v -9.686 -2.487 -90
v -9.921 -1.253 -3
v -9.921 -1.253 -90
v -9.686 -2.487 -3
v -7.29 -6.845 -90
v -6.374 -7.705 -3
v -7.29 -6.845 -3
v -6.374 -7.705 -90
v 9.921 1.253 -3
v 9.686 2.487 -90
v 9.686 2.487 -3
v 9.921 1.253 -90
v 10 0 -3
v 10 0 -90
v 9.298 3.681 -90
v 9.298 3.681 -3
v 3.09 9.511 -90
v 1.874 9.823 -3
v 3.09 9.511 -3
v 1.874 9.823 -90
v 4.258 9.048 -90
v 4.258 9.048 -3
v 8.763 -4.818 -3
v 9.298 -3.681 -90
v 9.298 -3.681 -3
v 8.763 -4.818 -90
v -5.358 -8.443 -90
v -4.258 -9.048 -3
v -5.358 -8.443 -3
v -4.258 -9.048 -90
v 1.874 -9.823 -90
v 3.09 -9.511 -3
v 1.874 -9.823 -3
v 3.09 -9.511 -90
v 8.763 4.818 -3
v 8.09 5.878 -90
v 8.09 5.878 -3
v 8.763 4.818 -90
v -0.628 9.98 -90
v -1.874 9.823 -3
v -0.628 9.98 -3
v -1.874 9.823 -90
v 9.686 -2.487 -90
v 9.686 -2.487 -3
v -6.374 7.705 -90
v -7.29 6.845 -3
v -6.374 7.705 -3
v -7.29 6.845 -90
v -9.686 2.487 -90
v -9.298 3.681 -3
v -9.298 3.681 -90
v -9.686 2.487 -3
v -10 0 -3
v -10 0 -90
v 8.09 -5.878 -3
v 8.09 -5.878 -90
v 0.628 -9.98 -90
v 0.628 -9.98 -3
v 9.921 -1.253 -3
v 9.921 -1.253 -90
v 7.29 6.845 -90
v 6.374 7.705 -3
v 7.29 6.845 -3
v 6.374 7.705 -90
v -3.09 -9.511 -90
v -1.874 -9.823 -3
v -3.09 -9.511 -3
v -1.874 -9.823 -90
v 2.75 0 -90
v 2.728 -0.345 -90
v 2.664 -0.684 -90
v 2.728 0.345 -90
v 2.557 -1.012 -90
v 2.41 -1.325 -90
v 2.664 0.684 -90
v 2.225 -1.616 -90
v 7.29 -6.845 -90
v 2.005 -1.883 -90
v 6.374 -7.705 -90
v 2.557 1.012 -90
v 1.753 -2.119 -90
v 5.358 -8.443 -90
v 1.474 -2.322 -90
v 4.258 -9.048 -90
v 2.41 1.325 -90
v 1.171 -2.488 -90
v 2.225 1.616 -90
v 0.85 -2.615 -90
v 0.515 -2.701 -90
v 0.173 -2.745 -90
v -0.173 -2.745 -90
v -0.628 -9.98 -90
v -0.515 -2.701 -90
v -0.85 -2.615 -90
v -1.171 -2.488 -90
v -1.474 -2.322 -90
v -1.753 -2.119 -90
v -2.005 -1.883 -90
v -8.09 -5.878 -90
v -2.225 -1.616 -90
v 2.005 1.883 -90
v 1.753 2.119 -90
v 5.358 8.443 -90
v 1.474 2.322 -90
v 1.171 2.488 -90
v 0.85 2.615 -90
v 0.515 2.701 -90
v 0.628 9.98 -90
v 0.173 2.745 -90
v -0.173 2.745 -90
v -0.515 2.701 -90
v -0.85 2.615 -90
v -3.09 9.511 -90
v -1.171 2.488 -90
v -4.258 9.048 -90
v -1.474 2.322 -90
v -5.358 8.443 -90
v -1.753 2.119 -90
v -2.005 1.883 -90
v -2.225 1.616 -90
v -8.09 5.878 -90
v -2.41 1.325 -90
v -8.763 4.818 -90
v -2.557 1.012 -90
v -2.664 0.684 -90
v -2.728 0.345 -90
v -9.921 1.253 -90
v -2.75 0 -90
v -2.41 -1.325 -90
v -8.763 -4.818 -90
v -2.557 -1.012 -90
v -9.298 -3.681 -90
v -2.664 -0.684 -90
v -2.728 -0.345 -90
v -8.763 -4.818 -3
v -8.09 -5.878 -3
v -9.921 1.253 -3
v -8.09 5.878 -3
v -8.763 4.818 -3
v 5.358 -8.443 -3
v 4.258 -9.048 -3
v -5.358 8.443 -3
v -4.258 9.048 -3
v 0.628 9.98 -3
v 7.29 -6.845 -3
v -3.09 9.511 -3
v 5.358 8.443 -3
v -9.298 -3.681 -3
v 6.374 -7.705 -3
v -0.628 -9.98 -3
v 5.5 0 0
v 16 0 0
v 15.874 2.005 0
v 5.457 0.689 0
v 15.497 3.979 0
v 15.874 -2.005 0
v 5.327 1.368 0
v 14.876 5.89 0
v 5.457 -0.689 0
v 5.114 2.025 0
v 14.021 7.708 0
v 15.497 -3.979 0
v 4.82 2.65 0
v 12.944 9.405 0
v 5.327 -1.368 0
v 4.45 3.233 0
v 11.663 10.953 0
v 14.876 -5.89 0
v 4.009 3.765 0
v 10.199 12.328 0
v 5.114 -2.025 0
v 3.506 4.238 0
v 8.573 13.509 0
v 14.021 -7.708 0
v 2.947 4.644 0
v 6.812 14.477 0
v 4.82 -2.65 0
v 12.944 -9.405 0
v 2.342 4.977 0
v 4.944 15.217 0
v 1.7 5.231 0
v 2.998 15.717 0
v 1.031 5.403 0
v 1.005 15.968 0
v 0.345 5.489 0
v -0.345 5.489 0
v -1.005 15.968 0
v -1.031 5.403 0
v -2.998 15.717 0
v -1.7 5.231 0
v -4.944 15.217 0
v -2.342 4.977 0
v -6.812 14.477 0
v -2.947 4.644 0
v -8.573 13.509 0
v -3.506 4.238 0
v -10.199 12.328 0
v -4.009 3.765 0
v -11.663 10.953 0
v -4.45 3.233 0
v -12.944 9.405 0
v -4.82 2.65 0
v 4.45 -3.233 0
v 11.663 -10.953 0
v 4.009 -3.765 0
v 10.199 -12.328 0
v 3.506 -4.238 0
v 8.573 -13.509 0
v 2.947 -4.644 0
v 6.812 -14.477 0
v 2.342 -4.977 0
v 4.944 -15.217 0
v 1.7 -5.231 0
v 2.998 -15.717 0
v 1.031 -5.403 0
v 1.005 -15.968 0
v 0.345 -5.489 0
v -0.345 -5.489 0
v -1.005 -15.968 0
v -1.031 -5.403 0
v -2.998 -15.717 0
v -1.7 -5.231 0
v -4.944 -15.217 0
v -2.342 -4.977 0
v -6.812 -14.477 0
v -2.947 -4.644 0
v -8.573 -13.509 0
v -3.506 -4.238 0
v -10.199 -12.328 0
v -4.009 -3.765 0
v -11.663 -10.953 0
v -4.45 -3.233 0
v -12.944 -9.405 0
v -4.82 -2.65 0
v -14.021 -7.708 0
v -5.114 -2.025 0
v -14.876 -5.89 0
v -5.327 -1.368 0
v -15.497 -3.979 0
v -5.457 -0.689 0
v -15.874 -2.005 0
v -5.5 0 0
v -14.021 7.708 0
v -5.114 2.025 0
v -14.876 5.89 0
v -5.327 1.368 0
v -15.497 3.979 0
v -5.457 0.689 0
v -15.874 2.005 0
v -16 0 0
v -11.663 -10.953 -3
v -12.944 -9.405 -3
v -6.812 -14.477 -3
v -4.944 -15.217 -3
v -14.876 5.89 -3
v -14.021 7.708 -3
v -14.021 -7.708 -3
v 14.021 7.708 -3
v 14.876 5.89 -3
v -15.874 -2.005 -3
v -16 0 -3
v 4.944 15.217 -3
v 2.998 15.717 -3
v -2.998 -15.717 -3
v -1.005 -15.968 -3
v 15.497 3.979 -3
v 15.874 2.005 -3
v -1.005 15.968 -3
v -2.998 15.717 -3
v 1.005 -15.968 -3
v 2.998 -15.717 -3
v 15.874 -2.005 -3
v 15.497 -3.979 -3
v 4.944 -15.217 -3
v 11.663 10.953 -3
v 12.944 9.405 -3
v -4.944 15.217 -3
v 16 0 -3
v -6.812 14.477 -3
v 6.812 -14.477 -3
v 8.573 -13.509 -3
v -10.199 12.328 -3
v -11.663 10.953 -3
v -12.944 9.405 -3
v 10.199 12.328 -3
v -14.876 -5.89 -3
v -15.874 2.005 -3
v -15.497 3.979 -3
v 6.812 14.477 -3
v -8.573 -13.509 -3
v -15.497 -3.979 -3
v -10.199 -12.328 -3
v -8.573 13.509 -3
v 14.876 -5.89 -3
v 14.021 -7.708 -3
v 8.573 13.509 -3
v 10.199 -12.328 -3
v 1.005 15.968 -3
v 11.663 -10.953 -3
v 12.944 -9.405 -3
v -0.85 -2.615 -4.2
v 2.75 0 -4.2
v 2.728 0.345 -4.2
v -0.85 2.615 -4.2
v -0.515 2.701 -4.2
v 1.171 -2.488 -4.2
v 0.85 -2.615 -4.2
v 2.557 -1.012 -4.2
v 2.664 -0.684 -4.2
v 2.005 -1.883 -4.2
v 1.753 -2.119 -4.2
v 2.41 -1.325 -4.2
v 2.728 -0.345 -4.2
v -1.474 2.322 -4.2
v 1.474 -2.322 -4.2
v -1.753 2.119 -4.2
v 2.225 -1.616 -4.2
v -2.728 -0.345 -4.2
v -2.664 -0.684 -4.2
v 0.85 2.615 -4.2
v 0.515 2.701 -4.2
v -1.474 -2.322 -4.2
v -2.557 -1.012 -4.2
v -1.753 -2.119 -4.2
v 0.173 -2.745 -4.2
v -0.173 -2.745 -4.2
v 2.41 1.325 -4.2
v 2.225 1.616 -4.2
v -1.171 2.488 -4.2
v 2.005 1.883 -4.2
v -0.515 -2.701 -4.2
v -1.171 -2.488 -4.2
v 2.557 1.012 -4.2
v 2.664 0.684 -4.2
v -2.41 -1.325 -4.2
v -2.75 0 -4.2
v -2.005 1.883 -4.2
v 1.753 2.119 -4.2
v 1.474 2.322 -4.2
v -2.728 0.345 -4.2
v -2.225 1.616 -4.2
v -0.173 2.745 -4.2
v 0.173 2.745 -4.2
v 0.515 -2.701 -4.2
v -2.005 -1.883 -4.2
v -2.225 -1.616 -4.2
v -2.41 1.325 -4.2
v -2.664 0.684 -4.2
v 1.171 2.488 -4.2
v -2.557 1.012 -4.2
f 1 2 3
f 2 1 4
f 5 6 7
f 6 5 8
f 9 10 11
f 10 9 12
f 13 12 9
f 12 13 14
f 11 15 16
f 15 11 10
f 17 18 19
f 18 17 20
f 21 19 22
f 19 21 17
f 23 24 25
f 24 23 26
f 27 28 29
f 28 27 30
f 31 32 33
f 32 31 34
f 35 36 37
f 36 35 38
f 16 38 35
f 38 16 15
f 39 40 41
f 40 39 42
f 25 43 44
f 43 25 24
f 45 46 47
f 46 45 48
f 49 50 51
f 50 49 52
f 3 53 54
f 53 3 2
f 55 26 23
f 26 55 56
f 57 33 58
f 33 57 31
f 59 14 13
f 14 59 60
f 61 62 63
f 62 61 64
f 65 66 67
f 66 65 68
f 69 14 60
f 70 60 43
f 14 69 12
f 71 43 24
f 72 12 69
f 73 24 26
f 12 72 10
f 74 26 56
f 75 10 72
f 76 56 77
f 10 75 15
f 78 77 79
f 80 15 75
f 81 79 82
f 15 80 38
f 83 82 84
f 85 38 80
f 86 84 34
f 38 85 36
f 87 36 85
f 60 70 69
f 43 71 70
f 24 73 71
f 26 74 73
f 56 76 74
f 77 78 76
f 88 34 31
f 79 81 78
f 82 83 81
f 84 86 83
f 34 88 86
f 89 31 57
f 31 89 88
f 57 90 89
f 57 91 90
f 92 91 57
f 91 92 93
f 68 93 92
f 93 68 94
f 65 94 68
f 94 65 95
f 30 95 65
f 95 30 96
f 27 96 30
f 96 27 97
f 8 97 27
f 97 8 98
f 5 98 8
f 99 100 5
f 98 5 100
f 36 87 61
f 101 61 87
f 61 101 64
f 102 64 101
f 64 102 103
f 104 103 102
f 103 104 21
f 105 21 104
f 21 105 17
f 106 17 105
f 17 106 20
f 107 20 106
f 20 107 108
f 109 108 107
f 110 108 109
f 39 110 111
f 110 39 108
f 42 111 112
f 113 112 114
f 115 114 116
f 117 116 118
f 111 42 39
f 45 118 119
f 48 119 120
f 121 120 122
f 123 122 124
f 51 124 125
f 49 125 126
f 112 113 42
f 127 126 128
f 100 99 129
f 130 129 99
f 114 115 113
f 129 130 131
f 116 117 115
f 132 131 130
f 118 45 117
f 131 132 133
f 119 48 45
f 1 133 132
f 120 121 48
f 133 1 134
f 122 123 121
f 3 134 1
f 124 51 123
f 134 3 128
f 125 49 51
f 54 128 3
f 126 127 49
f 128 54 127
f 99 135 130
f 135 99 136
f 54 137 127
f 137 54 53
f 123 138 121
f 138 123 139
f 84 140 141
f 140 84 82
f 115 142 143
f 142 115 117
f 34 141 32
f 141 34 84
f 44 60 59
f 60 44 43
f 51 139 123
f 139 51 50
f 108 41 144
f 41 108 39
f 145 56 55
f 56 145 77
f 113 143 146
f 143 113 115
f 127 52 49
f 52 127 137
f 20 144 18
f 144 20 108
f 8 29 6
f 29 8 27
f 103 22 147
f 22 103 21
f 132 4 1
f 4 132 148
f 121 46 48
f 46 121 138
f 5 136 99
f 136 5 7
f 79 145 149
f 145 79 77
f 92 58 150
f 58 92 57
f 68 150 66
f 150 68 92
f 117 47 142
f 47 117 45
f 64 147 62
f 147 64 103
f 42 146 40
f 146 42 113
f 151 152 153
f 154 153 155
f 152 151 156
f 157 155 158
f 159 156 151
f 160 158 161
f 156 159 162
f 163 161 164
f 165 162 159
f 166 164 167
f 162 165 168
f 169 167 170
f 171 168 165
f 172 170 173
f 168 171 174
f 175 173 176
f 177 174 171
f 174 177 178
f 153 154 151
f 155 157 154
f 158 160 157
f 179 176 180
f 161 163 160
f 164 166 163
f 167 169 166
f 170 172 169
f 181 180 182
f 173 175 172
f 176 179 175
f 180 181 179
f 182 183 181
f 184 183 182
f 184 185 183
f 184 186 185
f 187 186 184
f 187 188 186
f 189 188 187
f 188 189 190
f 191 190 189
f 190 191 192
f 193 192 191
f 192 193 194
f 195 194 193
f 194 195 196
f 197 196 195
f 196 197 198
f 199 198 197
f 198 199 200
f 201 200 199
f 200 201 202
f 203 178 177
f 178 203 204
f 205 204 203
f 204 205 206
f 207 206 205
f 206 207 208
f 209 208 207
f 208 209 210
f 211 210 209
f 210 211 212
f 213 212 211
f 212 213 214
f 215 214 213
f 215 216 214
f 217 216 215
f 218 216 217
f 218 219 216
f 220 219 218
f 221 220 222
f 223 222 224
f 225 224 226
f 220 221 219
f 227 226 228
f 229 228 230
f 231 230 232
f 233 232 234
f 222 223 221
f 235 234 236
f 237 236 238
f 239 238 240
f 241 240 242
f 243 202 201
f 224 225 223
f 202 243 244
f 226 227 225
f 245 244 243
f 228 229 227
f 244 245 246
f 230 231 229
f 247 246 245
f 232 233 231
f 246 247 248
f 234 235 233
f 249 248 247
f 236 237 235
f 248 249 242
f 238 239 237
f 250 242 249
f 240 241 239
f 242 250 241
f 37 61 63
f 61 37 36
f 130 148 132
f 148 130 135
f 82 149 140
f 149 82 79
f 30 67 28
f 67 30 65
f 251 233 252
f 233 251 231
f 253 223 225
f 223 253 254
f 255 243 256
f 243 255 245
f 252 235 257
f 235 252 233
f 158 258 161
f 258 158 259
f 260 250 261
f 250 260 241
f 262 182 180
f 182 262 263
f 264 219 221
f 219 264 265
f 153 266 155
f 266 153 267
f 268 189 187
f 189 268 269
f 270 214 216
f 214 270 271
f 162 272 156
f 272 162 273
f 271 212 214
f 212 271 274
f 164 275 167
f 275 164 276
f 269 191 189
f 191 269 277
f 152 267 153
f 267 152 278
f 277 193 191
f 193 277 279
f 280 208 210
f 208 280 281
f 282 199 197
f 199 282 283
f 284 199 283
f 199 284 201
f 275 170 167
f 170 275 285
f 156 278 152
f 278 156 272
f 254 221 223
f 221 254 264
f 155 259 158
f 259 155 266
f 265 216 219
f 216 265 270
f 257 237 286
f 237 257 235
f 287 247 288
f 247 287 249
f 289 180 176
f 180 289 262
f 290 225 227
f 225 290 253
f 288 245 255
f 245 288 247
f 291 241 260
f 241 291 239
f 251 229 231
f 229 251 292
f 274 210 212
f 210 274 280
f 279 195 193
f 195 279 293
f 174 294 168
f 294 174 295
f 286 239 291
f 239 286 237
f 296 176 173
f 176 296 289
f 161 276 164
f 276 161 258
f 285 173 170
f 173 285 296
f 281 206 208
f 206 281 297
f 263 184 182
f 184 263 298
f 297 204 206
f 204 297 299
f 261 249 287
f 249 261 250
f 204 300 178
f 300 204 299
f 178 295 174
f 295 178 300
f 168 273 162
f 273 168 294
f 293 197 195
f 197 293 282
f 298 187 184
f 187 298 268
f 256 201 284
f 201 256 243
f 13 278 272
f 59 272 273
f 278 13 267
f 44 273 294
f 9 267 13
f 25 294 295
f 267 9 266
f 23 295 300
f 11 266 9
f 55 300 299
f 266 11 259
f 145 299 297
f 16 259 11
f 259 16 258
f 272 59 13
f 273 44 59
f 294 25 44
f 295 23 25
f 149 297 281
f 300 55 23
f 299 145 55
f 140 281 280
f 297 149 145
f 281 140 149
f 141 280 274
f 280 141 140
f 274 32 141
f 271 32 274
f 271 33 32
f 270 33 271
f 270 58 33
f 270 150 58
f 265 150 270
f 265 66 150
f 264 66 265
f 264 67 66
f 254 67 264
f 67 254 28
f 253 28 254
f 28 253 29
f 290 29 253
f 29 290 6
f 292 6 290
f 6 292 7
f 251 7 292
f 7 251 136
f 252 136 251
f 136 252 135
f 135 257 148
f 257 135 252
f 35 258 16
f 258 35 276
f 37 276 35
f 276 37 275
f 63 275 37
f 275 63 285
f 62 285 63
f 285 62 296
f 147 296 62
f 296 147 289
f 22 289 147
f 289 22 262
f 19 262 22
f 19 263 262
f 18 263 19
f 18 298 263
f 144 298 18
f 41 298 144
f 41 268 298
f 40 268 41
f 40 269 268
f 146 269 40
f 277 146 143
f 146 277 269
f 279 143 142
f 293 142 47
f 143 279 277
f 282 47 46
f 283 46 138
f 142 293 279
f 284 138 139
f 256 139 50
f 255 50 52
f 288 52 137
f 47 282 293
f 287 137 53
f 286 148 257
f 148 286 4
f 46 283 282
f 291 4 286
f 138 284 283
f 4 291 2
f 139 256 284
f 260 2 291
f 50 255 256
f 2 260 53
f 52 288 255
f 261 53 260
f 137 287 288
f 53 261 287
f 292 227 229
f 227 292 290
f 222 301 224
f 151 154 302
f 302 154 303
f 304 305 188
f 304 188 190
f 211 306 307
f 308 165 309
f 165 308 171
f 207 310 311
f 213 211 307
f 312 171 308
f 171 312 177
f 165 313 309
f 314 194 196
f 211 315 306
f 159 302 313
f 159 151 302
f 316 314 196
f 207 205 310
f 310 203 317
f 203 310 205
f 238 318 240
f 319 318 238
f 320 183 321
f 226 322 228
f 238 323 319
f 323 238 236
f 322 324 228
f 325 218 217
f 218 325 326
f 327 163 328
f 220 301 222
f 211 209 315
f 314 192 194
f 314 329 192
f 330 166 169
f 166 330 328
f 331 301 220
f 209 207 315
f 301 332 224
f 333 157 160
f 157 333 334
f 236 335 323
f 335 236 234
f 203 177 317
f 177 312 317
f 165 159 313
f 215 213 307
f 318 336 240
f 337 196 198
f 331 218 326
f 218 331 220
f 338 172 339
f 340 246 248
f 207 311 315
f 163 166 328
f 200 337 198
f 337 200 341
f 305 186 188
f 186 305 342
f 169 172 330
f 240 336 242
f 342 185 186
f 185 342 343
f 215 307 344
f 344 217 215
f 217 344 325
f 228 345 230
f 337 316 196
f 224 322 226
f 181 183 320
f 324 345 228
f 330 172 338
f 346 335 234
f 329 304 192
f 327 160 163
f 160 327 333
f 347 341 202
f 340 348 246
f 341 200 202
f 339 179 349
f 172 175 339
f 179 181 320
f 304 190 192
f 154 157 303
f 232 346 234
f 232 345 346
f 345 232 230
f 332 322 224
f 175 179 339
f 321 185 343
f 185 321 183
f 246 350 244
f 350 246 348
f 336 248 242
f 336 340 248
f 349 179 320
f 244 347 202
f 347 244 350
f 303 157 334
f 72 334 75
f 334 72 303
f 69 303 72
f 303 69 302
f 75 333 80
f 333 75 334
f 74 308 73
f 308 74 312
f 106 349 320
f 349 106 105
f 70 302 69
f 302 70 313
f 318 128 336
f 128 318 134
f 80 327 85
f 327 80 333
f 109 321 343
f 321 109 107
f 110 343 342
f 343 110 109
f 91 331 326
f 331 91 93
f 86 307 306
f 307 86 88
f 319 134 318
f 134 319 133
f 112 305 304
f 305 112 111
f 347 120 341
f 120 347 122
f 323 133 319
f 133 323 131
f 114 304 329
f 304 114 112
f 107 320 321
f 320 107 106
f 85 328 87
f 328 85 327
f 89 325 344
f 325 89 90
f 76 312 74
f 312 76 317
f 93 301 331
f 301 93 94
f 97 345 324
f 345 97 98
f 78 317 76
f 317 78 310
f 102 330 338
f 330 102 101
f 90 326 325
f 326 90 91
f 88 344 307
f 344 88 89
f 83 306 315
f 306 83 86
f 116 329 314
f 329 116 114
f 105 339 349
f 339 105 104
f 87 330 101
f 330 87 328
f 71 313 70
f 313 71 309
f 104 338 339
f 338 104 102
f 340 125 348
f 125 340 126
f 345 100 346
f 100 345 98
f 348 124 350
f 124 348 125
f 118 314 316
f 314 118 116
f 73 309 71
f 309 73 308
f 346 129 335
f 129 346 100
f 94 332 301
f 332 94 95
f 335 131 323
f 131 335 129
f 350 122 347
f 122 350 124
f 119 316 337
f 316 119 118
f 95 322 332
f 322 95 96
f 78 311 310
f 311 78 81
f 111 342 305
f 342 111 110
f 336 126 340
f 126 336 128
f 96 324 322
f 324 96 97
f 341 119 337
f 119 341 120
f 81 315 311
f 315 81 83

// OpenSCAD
$fn = 50;


difference() {
	union() {
		translate(v = [0, 0, -90.0000000000]) {
			cylinder(h = 90, r = 10.0000000000);
		}
		translate(v = [0, 0, -3.0000000000]) {
			cylinder(h = 3, r = 16.0000000000);
		}
	}
	union() {
		translate(v = [0, 0, 0]) {
			rotate(a = [0, 0, 0]) {
				difference() {
					union() {
						#translate(v = [0, 0, -90.0000000000]) {
							cylinder(h = 90, r = 2.2500000000);
						}
						#translate(v = [0, 0, -4.2000000000]) {
							cylinder(h = 4.2000000000, r = 10.0000000000, r1 = 2.7500000000, r2 = 5.5000000000);
						}
						#translate(v = [0, 0, -90.0000000000]) {
							cylinder(h = 90, r = 2.7500000000);
						}
						#translate(v = [0, 0, -90.0000000000]) {
							cylinder(h = 90, r = 2.2500000000);
						}
					}
					union();
				}
			}
		}
	}
}
